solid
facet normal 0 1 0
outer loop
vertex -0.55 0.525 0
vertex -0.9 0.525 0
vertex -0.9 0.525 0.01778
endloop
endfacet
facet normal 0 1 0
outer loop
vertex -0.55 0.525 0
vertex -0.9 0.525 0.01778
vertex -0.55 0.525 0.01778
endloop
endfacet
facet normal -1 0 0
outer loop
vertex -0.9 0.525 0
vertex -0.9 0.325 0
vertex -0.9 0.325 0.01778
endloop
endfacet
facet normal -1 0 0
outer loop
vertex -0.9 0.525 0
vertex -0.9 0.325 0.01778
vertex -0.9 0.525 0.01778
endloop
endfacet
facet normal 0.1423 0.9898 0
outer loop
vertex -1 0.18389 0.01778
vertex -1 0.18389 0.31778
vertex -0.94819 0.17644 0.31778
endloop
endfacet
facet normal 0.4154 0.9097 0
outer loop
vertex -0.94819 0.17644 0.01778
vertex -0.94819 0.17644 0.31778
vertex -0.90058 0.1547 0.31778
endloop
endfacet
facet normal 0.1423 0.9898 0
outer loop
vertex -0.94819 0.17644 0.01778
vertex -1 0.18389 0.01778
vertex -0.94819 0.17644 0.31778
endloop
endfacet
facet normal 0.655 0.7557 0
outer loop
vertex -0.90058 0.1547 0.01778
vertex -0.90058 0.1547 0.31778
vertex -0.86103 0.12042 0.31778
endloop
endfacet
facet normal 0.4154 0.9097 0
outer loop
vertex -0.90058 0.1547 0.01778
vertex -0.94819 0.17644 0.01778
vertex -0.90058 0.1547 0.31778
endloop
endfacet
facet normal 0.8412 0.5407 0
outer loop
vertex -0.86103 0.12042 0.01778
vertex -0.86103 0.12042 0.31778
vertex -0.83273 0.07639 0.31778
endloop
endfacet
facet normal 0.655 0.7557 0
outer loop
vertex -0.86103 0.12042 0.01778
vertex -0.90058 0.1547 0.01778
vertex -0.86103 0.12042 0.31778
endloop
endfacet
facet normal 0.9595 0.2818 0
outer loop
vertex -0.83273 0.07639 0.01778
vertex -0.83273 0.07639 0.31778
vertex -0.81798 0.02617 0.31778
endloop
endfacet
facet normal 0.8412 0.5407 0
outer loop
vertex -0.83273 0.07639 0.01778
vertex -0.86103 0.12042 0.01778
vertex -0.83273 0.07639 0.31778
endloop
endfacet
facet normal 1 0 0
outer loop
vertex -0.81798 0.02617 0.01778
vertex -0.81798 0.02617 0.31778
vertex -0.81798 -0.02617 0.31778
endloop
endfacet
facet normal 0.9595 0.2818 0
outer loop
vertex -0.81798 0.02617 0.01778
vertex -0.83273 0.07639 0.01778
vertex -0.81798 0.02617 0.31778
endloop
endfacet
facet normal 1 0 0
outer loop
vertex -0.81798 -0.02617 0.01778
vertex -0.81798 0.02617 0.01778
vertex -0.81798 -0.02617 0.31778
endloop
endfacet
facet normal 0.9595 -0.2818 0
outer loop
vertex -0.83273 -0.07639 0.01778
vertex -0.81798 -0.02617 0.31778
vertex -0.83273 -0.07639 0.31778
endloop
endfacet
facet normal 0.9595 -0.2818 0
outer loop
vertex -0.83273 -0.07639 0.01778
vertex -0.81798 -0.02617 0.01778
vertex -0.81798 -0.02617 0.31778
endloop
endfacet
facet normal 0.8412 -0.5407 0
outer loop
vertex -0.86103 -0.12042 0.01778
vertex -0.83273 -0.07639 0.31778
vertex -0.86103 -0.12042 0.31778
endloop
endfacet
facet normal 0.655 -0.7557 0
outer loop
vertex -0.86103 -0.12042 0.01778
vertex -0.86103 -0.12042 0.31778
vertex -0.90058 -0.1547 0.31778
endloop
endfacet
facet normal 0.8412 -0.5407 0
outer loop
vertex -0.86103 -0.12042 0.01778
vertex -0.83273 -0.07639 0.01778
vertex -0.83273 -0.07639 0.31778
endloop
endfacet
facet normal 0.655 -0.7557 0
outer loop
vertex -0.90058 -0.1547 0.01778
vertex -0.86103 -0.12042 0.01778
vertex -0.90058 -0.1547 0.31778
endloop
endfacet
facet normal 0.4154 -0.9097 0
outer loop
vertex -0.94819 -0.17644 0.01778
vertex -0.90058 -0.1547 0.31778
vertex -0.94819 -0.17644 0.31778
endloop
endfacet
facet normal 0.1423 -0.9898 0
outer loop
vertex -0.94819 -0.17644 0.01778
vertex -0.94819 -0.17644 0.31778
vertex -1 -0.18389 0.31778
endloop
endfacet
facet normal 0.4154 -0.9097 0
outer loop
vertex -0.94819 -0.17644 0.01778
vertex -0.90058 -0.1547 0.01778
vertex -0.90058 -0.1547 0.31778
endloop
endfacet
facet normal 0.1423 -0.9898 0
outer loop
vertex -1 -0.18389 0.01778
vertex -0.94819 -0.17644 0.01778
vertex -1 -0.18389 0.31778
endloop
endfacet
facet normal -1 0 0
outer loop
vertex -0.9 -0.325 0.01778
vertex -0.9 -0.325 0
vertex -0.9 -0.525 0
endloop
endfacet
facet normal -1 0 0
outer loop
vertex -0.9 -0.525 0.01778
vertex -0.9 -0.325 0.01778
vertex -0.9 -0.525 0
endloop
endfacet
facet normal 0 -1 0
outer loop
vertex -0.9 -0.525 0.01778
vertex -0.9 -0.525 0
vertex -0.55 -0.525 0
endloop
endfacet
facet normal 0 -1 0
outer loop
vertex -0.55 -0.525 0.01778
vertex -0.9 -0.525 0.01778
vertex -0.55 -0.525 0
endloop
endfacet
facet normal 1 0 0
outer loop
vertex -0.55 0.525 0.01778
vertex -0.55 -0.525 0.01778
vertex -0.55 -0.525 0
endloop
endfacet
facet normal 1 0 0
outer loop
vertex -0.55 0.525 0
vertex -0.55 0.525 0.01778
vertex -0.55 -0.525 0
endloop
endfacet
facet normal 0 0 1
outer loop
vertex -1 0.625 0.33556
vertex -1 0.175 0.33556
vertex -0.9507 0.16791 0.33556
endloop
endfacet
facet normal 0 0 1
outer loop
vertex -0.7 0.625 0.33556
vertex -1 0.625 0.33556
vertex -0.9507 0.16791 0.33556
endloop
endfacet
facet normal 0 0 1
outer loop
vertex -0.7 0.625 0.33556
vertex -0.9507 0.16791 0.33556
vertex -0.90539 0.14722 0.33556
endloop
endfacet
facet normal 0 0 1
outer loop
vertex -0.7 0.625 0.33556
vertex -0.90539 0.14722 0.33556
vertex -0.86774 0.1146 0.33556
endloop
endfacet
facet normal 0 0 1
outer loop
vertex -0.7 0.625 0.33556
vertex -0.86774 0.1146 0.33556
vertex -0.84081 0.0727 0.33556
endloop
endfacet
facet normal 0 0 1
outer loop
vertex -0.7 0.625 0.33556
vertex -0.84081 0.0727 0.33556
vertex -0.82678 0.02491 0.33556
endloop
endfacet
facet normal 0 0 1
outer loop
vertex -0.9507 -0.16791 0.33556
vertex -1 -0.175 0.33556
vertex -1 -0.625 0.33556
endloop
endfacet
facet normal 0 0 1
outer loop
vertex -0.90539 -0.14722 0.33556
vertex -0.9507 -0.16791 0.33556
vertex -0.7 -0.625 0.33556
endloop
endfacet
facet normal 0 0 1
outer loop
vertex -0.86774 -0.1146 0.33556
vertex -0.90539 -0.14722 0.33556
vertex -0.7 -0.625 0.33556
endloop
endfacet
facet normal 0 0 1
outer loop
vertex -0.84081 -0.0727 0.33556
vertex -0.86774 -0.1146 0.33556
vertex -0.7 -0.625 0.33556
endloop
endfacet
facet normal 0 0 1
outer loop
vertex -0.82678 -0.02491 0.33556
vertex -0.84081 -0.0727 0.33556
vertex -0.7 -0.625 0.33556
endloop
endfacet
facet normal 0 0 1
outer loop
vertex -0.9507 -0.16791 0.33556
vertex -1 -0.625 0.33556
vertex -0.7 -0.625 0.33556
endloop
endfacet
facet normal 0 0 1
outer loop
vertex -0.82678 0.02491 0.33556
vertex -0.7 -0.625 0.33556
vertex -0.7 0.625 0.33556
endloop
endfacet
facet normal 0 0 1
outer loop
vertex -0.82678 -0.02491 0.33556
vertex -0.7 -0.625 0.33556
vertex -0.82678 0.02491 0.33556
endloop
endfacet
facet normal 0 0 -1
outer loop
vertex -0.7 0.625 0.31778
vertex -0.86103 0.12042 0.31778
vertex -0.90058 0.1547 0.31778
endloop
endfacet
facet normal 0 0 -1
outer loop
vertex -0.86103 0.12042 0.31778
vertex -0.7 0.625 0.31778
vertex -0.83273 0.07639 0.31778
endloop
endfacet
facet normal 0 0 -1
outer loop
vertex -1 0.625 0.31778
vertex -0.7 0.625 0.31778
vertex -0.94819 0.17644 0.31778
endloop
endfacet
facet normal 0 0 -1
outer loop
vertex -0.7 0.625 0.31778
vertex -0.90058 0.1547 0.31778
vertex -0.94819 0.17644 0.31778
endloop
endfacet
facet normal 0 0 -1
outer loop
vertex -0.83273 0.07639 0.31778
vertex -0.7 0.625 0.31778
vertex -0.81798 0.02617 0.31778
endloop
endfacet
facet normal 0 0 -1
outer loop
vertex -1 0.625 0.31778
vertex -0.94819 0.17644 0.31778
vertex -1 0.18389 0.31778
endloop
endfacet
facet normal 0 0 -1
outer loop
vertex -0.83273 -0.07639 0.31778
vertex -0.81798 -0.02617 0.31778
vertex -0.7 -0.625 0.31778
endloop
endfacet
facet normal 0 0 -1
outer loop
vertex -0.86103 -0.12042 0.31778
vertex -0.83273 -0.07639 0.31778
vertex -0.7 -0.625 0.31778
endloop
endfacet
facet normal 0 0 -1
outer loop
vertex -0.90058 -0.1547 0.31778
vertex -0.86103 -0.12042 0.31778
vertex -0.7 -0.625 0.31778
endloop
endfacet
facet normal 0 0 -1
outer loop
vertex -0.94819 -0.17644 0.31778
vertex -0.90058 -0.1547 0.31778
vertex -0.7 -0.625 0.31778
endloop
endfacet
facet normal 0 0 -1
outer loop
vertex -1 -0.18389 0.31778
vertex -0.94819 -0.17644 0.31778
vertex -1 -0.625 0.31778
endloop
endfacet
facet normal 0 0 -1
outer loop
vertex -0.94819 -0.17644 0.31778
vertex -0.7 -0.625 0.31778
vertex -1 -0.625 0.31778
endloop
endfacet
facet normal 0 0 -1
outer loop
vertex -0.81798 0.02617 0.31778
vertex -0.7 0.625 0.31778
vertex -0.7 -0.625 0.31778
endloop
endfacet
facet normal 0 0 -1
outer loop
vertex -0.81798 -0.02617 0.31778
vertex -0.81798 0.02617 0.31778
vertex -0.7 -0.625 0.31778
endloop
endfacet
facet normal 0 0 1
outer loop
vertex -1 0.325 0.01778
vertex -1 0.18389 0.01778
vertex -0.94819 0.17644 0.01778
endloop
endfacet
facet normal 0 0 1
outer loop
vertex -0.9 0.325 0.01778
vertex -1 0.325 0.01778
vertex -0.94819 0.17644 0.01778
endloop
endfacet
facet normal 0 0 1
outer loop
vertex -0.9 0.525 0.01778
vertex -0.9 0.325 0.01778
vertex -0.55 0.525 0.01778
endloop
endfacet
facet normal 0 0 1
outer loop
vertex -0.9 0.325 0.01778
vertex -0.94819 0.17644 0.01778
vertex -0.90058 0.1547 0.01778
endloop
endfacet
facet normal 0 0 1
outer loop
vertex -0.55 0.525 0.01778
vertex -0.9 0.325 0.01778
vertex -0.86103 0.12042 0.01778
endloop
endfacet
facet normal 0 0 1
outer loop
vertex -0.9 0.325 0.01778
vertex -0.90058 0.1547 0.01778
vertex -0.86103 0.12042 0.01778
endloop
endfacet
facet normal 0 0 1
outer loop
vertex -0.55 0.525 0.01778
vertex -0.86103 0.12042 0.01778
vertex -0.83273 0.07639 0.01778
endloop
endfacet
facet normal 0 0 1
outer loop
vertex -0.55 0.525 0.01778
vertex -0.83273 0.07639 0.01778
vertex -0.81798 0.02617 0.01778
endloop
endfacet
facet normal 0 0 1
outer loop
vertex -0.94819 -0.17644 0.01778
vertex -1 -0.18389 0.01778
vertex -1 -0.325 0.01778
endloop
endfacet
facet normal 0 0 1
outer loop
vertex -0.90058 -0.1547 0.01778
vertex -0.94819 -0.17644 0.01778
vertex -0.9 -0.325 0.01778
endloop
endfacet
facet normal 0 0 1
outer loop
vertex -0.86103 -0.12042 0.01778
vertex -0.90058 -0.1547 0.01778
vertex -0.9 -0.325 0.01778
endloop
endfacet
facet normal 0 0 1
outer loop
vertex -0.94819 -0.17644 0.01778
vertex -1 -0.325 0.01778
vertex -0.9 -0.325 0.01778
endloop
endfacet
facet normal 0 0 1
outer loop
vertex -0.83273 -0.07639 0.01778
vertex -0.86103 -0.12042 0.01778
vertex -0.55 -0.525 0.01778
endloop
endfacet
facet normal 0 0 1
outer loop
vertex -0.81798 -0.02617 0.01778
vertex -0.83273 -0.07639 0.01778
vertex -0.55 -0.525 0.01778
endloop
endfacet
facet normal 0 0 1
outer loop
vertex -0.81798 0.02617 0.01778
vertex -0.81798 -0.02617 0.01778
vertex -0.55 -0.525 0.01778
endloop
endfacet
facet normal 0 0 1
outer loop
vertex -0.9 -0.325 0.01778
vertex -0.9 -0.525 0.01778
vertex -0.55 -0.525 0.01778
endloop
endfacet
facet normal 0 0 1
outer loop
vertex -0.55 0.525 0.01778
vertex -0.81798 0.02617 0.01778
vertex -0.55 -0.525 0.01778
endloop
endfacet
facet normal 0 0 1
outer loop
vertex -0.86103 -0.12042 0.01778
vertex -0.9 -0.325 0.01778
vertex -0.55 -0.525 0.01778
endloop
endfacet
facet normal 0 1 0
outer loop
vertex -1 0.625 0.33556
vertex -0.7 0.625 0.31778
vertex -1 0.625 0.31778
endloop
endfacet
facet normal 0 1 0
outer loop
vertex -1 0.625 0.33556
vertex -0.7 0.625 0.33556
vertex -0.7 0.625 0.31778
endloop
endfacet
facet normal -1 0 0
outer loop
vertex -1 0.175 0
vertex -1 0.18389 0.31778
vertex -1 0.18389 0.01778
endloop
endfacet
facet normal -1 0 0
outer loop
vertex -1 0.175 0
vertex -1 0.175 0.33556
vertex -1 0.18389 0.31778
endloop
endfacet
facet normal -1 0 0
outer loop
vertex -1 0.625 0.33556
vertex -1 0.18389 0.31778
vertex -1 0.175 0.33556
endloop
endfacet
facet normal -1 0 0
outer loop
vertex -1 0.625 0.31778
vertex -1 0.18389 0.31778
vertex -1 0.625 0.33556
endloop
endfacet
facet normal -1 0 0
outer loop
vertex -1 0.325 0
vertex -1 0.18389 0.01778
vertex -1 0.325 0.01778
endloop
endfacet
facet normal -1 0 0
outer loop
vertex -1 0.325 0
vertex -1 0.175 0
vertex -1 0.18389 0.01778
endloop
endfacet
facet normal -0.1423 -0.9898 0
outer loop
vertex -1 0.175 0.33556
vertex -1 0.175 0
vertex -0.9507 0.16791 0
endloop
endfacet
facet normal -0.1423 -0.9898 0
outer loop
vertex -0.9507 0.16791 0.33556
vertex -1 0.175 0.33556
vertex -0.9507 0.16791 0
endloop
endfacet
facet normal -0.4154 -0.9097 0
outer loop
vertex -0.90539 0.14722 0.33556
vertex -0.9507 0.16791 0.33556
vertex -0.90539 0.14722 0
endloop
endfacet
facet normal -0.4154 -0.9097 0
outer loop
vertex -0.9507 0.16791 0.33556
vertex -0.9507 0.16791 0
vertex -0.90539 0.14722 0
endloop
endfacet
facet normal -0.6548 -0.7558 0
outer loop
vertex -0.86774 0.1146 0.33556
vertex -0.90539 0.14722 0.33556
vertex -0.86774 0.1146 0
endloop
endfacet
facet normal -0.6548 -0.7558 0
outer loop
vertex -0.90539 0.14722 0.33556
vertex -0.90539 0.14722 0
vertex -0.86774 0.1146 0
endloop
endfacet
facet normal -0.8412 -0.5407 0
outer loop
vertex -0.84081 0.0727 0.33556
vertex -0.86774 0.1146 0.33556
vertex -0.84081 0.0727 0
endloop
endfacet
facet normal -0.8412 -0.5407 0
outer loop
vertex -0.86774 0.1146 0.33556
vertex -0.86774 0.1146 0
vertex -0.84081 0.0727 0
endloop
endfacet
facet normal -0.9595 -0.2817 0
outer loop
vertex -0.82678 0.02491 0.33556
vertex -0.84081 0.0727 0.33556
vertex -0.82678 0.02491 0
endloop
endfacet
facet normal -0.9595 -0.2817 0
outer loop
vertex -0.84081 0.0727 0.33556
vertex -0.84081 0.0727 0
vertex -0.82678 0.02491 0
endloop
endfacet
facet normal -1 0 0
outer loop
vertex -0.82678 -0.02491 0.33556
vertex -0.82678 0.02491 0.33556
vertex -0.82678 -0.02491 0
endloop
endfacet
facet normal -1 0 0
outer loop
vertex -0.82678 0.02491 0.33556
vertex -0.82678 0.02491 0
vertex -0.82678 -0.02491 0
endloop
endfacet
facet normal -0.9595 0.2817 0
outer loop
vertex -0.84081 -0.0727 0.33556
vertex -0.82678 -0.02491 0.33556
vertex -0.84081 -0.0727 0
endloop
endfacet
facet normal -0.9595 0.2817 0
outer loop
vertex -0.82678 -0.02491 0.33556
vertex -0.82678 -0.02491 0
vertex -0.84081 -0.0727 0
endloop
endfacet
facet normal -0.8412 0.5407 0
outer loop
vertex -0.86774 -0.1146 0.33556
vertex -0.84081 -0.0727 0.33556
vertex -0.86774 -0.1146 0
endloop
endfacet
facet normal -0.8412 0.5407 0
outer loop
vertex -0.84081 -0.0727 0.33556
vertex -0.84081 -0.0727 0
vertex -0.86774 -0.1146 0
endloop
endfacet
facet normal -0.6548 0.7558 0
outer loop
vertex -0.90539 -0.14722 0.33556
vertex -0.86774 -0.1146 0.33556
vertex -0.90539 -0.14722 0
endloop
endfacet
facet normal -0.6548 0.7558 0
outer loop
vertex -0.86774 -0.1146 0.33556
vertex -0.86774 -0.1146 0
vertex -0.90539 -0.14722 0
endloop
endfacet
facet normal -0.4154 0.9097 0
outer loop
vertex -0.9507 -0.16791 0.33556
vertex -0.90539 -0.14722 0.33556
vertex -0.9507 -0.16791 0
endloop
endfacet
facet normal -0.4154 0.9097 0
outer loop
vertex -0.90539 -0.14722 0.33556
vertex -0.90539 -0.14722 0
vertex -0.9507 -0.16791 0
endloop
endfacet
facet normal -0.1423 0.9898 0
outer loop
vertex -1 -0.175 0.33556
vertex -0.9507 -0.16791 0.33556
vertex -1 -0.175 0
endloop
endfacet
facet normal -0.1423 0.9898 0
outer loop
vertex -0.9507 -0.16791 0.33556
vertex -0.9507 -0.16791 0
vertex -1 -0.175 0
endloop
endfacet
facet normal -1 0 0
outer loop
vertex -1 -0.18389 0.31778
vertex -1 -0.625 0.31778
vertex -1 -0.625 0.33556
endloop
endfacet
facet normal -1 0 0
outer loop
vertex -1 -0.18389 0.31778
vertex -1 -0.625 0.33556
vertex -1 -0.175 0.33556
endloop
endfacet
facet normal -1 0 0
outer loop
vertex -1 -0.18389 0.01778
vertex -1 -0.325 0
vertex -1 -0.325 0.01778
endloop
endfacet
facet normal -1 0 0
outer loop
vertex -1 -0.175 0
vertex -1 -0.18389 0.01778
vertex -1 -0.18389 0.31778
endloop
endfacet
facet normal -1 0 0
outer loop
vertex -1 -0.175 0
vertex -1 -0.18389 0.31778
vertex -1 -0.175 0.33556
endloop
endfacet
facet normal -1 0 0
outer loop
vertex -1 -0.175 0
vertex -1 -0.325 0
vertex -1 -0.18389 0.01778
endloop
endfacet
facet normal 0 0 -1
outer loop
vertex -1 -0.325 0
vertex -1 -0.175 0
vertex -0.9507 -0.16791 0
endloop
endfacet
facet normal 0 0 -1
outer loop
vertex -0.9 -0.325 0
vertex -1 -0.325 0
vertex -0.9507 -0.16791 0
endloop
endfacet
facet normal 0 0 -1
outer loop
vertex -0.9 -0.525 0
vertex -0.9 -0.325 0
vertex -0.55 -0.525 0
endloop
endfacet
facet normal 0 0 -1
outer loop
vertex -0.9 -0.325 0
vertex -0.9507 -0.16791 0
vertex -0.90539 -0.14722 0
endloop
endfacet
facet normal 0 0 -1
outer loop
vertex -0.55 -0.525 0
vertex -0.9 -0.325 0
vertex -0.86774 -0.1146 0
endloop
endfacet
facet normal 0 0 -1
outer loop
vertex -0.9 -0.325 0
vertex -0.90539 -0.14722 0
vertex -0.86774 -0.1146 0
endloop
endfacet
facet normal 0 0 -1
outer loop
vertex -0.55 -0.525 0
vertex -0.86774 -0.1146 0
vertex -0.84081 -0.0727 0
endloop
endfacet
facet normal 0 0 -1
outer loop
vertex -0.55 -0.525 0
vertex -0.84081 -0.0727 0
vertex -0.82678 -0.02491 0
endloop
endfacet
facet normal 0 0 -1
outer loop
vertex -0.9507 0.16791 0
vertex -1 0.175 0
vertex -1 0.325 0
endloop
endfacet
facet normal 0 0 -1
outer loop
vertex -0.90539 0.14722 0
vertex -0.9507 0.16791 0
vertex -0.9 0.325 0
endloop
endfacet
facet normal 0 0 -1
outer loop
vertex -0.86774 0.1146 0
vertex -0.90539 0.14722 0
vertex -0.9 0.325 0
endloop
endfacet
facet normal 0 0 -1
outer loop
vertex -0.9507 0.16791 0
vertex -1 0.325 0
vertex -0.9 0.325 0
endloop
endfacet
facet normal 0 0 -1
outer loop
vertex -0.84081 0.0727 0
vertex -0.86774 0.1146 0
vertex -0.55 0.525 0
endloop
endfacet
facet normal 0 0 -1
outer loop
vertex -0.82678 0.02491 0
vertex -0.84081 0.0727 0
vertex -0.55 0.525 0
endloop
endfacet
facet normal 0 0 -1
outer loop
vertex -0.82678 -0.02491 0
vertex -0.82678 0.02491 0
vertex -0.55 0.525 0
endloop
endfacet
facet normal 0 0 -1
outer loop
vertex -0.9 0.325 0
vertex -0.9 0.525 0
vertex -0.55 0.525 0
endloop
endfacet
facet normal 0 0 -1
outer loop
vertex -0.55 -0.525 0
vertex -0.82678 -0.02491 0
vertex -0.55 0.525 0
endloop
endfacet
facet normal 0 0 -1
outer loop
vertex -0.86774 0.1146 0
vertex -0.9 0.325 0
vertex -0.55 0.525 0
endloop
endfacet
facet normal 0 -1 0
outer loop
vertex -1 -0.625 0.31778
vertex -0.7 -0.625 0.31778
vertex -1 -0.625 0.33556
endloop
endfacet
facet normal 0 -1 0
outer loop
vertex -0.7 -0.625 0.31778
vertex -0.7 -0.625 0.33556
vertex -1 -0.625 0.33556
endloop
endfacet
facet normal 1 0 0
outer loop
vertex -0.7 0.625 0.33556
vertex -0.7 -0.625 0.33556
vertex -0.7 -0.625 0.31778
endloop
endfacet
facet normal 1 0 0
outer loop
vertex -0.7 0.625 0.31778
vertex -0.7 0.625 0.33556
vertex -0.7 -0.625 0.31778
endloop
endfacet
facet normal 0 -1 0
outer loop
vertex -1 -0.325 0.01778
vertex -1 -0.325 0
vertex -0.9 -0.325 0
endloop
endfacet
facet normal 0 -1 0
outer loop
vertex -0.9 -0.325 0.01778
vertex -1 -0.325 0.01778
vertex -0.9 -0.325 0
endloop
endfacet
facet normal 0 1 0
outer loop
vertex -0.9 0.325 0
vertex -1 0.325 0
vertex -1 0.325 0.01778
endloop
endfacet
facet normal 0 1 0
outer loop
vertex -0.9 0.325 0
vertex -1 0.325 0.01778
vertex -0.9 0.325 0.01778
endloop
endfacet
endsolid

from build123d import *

# Parameters (mm, degrees)
PAD_DEPTH            = 0.625
PAD_DEPTH_BACK       = 0.625
PAD001_DEPTH         = 0.31778
POCKET_DEPTH         = 0.01778
POCKET001_DEPTH      = 0.001
POCKET001_DEPTH_BACK = 0.33656


with BuildPart() as body:
    # Sketch → Pad (new body, two sides)
    with BuildSketch(Plane.XZ) as pad_sk:
        Polygon((0.55, 0), (1.01778, 0), (1.01778, 0.33556), (0.7, 0.33556), (0.7, 0.31778), (1, 0.31778), (1, 0.01778), (0.55, 0.01778), align=None)
    extrude(amount=PAD_DEPTH)
    extrude(pad_sk.sketch, amount=-PAD_DEPTH_BACK)

    # Sketch001 → Pad001 (join)
    with BuildSketch(Plane.XY):
        with BuildLine():
            Line((1, 0.18389), (1, -0.18389))
            ThreePointArc((1, 0.18389), (0.81611, 0), (1, -0.18389))
        make_face()
    extrude(amount=PAD001_DEPTH)

    # Sketch003 → Pocket (cut)
    with BuildSketch(Plane.XY):
        Polygon((0.55, 0.625), (1, 0.625), (1, 0.325), (0.9, 0.325), (0.9, 0.525), (0.55, 0.525), align=None)
    pocket = extrude(amount=POCKET_DEPTH, mode=Mode.SUBTRACT)

    # Mirrored: Pocket across Sketch003 H_Axis
    add(pocket.mirror(Plane.ZX), mode=Mode.SUBTRACT)

    # Sketch004 → Pocket001 (cut, two sides)
    with BuildSketch(Plane.XY) as pocket001_sk:
        with BuildLine():
            Line((1, 0.175), (1, 0.625))
            Line((1, 0.625), (1.01778, 0.625))
            Line((1.01778, 0.625), (1.01778, -0.625))
            Line((1.01778, -0.625), (1, -0.625))
            Line((1, -0.625), (1, -0.175))
            ThreePointArc((1, 0.175), (0.825, 0), (1, -0.175))
        make_face()
    extrude(amount=-POCKET001_DEPTH, mode=Mode.SUBTRACT)
    extrude(pocket001_sk.sketch, amount=POCKET001_DEPTH_BACK, mode=Mode.SUBTRACT)


with BuildPart() as part_mirroring:
    # Part__Mirroring: instance of Body
    add(body.part.mirror(Plane(origin=(0, 0, 0), x_dir=(0, -1, 0), z_dir=(1, 0, 0))))


solid = part_mirroring.part
